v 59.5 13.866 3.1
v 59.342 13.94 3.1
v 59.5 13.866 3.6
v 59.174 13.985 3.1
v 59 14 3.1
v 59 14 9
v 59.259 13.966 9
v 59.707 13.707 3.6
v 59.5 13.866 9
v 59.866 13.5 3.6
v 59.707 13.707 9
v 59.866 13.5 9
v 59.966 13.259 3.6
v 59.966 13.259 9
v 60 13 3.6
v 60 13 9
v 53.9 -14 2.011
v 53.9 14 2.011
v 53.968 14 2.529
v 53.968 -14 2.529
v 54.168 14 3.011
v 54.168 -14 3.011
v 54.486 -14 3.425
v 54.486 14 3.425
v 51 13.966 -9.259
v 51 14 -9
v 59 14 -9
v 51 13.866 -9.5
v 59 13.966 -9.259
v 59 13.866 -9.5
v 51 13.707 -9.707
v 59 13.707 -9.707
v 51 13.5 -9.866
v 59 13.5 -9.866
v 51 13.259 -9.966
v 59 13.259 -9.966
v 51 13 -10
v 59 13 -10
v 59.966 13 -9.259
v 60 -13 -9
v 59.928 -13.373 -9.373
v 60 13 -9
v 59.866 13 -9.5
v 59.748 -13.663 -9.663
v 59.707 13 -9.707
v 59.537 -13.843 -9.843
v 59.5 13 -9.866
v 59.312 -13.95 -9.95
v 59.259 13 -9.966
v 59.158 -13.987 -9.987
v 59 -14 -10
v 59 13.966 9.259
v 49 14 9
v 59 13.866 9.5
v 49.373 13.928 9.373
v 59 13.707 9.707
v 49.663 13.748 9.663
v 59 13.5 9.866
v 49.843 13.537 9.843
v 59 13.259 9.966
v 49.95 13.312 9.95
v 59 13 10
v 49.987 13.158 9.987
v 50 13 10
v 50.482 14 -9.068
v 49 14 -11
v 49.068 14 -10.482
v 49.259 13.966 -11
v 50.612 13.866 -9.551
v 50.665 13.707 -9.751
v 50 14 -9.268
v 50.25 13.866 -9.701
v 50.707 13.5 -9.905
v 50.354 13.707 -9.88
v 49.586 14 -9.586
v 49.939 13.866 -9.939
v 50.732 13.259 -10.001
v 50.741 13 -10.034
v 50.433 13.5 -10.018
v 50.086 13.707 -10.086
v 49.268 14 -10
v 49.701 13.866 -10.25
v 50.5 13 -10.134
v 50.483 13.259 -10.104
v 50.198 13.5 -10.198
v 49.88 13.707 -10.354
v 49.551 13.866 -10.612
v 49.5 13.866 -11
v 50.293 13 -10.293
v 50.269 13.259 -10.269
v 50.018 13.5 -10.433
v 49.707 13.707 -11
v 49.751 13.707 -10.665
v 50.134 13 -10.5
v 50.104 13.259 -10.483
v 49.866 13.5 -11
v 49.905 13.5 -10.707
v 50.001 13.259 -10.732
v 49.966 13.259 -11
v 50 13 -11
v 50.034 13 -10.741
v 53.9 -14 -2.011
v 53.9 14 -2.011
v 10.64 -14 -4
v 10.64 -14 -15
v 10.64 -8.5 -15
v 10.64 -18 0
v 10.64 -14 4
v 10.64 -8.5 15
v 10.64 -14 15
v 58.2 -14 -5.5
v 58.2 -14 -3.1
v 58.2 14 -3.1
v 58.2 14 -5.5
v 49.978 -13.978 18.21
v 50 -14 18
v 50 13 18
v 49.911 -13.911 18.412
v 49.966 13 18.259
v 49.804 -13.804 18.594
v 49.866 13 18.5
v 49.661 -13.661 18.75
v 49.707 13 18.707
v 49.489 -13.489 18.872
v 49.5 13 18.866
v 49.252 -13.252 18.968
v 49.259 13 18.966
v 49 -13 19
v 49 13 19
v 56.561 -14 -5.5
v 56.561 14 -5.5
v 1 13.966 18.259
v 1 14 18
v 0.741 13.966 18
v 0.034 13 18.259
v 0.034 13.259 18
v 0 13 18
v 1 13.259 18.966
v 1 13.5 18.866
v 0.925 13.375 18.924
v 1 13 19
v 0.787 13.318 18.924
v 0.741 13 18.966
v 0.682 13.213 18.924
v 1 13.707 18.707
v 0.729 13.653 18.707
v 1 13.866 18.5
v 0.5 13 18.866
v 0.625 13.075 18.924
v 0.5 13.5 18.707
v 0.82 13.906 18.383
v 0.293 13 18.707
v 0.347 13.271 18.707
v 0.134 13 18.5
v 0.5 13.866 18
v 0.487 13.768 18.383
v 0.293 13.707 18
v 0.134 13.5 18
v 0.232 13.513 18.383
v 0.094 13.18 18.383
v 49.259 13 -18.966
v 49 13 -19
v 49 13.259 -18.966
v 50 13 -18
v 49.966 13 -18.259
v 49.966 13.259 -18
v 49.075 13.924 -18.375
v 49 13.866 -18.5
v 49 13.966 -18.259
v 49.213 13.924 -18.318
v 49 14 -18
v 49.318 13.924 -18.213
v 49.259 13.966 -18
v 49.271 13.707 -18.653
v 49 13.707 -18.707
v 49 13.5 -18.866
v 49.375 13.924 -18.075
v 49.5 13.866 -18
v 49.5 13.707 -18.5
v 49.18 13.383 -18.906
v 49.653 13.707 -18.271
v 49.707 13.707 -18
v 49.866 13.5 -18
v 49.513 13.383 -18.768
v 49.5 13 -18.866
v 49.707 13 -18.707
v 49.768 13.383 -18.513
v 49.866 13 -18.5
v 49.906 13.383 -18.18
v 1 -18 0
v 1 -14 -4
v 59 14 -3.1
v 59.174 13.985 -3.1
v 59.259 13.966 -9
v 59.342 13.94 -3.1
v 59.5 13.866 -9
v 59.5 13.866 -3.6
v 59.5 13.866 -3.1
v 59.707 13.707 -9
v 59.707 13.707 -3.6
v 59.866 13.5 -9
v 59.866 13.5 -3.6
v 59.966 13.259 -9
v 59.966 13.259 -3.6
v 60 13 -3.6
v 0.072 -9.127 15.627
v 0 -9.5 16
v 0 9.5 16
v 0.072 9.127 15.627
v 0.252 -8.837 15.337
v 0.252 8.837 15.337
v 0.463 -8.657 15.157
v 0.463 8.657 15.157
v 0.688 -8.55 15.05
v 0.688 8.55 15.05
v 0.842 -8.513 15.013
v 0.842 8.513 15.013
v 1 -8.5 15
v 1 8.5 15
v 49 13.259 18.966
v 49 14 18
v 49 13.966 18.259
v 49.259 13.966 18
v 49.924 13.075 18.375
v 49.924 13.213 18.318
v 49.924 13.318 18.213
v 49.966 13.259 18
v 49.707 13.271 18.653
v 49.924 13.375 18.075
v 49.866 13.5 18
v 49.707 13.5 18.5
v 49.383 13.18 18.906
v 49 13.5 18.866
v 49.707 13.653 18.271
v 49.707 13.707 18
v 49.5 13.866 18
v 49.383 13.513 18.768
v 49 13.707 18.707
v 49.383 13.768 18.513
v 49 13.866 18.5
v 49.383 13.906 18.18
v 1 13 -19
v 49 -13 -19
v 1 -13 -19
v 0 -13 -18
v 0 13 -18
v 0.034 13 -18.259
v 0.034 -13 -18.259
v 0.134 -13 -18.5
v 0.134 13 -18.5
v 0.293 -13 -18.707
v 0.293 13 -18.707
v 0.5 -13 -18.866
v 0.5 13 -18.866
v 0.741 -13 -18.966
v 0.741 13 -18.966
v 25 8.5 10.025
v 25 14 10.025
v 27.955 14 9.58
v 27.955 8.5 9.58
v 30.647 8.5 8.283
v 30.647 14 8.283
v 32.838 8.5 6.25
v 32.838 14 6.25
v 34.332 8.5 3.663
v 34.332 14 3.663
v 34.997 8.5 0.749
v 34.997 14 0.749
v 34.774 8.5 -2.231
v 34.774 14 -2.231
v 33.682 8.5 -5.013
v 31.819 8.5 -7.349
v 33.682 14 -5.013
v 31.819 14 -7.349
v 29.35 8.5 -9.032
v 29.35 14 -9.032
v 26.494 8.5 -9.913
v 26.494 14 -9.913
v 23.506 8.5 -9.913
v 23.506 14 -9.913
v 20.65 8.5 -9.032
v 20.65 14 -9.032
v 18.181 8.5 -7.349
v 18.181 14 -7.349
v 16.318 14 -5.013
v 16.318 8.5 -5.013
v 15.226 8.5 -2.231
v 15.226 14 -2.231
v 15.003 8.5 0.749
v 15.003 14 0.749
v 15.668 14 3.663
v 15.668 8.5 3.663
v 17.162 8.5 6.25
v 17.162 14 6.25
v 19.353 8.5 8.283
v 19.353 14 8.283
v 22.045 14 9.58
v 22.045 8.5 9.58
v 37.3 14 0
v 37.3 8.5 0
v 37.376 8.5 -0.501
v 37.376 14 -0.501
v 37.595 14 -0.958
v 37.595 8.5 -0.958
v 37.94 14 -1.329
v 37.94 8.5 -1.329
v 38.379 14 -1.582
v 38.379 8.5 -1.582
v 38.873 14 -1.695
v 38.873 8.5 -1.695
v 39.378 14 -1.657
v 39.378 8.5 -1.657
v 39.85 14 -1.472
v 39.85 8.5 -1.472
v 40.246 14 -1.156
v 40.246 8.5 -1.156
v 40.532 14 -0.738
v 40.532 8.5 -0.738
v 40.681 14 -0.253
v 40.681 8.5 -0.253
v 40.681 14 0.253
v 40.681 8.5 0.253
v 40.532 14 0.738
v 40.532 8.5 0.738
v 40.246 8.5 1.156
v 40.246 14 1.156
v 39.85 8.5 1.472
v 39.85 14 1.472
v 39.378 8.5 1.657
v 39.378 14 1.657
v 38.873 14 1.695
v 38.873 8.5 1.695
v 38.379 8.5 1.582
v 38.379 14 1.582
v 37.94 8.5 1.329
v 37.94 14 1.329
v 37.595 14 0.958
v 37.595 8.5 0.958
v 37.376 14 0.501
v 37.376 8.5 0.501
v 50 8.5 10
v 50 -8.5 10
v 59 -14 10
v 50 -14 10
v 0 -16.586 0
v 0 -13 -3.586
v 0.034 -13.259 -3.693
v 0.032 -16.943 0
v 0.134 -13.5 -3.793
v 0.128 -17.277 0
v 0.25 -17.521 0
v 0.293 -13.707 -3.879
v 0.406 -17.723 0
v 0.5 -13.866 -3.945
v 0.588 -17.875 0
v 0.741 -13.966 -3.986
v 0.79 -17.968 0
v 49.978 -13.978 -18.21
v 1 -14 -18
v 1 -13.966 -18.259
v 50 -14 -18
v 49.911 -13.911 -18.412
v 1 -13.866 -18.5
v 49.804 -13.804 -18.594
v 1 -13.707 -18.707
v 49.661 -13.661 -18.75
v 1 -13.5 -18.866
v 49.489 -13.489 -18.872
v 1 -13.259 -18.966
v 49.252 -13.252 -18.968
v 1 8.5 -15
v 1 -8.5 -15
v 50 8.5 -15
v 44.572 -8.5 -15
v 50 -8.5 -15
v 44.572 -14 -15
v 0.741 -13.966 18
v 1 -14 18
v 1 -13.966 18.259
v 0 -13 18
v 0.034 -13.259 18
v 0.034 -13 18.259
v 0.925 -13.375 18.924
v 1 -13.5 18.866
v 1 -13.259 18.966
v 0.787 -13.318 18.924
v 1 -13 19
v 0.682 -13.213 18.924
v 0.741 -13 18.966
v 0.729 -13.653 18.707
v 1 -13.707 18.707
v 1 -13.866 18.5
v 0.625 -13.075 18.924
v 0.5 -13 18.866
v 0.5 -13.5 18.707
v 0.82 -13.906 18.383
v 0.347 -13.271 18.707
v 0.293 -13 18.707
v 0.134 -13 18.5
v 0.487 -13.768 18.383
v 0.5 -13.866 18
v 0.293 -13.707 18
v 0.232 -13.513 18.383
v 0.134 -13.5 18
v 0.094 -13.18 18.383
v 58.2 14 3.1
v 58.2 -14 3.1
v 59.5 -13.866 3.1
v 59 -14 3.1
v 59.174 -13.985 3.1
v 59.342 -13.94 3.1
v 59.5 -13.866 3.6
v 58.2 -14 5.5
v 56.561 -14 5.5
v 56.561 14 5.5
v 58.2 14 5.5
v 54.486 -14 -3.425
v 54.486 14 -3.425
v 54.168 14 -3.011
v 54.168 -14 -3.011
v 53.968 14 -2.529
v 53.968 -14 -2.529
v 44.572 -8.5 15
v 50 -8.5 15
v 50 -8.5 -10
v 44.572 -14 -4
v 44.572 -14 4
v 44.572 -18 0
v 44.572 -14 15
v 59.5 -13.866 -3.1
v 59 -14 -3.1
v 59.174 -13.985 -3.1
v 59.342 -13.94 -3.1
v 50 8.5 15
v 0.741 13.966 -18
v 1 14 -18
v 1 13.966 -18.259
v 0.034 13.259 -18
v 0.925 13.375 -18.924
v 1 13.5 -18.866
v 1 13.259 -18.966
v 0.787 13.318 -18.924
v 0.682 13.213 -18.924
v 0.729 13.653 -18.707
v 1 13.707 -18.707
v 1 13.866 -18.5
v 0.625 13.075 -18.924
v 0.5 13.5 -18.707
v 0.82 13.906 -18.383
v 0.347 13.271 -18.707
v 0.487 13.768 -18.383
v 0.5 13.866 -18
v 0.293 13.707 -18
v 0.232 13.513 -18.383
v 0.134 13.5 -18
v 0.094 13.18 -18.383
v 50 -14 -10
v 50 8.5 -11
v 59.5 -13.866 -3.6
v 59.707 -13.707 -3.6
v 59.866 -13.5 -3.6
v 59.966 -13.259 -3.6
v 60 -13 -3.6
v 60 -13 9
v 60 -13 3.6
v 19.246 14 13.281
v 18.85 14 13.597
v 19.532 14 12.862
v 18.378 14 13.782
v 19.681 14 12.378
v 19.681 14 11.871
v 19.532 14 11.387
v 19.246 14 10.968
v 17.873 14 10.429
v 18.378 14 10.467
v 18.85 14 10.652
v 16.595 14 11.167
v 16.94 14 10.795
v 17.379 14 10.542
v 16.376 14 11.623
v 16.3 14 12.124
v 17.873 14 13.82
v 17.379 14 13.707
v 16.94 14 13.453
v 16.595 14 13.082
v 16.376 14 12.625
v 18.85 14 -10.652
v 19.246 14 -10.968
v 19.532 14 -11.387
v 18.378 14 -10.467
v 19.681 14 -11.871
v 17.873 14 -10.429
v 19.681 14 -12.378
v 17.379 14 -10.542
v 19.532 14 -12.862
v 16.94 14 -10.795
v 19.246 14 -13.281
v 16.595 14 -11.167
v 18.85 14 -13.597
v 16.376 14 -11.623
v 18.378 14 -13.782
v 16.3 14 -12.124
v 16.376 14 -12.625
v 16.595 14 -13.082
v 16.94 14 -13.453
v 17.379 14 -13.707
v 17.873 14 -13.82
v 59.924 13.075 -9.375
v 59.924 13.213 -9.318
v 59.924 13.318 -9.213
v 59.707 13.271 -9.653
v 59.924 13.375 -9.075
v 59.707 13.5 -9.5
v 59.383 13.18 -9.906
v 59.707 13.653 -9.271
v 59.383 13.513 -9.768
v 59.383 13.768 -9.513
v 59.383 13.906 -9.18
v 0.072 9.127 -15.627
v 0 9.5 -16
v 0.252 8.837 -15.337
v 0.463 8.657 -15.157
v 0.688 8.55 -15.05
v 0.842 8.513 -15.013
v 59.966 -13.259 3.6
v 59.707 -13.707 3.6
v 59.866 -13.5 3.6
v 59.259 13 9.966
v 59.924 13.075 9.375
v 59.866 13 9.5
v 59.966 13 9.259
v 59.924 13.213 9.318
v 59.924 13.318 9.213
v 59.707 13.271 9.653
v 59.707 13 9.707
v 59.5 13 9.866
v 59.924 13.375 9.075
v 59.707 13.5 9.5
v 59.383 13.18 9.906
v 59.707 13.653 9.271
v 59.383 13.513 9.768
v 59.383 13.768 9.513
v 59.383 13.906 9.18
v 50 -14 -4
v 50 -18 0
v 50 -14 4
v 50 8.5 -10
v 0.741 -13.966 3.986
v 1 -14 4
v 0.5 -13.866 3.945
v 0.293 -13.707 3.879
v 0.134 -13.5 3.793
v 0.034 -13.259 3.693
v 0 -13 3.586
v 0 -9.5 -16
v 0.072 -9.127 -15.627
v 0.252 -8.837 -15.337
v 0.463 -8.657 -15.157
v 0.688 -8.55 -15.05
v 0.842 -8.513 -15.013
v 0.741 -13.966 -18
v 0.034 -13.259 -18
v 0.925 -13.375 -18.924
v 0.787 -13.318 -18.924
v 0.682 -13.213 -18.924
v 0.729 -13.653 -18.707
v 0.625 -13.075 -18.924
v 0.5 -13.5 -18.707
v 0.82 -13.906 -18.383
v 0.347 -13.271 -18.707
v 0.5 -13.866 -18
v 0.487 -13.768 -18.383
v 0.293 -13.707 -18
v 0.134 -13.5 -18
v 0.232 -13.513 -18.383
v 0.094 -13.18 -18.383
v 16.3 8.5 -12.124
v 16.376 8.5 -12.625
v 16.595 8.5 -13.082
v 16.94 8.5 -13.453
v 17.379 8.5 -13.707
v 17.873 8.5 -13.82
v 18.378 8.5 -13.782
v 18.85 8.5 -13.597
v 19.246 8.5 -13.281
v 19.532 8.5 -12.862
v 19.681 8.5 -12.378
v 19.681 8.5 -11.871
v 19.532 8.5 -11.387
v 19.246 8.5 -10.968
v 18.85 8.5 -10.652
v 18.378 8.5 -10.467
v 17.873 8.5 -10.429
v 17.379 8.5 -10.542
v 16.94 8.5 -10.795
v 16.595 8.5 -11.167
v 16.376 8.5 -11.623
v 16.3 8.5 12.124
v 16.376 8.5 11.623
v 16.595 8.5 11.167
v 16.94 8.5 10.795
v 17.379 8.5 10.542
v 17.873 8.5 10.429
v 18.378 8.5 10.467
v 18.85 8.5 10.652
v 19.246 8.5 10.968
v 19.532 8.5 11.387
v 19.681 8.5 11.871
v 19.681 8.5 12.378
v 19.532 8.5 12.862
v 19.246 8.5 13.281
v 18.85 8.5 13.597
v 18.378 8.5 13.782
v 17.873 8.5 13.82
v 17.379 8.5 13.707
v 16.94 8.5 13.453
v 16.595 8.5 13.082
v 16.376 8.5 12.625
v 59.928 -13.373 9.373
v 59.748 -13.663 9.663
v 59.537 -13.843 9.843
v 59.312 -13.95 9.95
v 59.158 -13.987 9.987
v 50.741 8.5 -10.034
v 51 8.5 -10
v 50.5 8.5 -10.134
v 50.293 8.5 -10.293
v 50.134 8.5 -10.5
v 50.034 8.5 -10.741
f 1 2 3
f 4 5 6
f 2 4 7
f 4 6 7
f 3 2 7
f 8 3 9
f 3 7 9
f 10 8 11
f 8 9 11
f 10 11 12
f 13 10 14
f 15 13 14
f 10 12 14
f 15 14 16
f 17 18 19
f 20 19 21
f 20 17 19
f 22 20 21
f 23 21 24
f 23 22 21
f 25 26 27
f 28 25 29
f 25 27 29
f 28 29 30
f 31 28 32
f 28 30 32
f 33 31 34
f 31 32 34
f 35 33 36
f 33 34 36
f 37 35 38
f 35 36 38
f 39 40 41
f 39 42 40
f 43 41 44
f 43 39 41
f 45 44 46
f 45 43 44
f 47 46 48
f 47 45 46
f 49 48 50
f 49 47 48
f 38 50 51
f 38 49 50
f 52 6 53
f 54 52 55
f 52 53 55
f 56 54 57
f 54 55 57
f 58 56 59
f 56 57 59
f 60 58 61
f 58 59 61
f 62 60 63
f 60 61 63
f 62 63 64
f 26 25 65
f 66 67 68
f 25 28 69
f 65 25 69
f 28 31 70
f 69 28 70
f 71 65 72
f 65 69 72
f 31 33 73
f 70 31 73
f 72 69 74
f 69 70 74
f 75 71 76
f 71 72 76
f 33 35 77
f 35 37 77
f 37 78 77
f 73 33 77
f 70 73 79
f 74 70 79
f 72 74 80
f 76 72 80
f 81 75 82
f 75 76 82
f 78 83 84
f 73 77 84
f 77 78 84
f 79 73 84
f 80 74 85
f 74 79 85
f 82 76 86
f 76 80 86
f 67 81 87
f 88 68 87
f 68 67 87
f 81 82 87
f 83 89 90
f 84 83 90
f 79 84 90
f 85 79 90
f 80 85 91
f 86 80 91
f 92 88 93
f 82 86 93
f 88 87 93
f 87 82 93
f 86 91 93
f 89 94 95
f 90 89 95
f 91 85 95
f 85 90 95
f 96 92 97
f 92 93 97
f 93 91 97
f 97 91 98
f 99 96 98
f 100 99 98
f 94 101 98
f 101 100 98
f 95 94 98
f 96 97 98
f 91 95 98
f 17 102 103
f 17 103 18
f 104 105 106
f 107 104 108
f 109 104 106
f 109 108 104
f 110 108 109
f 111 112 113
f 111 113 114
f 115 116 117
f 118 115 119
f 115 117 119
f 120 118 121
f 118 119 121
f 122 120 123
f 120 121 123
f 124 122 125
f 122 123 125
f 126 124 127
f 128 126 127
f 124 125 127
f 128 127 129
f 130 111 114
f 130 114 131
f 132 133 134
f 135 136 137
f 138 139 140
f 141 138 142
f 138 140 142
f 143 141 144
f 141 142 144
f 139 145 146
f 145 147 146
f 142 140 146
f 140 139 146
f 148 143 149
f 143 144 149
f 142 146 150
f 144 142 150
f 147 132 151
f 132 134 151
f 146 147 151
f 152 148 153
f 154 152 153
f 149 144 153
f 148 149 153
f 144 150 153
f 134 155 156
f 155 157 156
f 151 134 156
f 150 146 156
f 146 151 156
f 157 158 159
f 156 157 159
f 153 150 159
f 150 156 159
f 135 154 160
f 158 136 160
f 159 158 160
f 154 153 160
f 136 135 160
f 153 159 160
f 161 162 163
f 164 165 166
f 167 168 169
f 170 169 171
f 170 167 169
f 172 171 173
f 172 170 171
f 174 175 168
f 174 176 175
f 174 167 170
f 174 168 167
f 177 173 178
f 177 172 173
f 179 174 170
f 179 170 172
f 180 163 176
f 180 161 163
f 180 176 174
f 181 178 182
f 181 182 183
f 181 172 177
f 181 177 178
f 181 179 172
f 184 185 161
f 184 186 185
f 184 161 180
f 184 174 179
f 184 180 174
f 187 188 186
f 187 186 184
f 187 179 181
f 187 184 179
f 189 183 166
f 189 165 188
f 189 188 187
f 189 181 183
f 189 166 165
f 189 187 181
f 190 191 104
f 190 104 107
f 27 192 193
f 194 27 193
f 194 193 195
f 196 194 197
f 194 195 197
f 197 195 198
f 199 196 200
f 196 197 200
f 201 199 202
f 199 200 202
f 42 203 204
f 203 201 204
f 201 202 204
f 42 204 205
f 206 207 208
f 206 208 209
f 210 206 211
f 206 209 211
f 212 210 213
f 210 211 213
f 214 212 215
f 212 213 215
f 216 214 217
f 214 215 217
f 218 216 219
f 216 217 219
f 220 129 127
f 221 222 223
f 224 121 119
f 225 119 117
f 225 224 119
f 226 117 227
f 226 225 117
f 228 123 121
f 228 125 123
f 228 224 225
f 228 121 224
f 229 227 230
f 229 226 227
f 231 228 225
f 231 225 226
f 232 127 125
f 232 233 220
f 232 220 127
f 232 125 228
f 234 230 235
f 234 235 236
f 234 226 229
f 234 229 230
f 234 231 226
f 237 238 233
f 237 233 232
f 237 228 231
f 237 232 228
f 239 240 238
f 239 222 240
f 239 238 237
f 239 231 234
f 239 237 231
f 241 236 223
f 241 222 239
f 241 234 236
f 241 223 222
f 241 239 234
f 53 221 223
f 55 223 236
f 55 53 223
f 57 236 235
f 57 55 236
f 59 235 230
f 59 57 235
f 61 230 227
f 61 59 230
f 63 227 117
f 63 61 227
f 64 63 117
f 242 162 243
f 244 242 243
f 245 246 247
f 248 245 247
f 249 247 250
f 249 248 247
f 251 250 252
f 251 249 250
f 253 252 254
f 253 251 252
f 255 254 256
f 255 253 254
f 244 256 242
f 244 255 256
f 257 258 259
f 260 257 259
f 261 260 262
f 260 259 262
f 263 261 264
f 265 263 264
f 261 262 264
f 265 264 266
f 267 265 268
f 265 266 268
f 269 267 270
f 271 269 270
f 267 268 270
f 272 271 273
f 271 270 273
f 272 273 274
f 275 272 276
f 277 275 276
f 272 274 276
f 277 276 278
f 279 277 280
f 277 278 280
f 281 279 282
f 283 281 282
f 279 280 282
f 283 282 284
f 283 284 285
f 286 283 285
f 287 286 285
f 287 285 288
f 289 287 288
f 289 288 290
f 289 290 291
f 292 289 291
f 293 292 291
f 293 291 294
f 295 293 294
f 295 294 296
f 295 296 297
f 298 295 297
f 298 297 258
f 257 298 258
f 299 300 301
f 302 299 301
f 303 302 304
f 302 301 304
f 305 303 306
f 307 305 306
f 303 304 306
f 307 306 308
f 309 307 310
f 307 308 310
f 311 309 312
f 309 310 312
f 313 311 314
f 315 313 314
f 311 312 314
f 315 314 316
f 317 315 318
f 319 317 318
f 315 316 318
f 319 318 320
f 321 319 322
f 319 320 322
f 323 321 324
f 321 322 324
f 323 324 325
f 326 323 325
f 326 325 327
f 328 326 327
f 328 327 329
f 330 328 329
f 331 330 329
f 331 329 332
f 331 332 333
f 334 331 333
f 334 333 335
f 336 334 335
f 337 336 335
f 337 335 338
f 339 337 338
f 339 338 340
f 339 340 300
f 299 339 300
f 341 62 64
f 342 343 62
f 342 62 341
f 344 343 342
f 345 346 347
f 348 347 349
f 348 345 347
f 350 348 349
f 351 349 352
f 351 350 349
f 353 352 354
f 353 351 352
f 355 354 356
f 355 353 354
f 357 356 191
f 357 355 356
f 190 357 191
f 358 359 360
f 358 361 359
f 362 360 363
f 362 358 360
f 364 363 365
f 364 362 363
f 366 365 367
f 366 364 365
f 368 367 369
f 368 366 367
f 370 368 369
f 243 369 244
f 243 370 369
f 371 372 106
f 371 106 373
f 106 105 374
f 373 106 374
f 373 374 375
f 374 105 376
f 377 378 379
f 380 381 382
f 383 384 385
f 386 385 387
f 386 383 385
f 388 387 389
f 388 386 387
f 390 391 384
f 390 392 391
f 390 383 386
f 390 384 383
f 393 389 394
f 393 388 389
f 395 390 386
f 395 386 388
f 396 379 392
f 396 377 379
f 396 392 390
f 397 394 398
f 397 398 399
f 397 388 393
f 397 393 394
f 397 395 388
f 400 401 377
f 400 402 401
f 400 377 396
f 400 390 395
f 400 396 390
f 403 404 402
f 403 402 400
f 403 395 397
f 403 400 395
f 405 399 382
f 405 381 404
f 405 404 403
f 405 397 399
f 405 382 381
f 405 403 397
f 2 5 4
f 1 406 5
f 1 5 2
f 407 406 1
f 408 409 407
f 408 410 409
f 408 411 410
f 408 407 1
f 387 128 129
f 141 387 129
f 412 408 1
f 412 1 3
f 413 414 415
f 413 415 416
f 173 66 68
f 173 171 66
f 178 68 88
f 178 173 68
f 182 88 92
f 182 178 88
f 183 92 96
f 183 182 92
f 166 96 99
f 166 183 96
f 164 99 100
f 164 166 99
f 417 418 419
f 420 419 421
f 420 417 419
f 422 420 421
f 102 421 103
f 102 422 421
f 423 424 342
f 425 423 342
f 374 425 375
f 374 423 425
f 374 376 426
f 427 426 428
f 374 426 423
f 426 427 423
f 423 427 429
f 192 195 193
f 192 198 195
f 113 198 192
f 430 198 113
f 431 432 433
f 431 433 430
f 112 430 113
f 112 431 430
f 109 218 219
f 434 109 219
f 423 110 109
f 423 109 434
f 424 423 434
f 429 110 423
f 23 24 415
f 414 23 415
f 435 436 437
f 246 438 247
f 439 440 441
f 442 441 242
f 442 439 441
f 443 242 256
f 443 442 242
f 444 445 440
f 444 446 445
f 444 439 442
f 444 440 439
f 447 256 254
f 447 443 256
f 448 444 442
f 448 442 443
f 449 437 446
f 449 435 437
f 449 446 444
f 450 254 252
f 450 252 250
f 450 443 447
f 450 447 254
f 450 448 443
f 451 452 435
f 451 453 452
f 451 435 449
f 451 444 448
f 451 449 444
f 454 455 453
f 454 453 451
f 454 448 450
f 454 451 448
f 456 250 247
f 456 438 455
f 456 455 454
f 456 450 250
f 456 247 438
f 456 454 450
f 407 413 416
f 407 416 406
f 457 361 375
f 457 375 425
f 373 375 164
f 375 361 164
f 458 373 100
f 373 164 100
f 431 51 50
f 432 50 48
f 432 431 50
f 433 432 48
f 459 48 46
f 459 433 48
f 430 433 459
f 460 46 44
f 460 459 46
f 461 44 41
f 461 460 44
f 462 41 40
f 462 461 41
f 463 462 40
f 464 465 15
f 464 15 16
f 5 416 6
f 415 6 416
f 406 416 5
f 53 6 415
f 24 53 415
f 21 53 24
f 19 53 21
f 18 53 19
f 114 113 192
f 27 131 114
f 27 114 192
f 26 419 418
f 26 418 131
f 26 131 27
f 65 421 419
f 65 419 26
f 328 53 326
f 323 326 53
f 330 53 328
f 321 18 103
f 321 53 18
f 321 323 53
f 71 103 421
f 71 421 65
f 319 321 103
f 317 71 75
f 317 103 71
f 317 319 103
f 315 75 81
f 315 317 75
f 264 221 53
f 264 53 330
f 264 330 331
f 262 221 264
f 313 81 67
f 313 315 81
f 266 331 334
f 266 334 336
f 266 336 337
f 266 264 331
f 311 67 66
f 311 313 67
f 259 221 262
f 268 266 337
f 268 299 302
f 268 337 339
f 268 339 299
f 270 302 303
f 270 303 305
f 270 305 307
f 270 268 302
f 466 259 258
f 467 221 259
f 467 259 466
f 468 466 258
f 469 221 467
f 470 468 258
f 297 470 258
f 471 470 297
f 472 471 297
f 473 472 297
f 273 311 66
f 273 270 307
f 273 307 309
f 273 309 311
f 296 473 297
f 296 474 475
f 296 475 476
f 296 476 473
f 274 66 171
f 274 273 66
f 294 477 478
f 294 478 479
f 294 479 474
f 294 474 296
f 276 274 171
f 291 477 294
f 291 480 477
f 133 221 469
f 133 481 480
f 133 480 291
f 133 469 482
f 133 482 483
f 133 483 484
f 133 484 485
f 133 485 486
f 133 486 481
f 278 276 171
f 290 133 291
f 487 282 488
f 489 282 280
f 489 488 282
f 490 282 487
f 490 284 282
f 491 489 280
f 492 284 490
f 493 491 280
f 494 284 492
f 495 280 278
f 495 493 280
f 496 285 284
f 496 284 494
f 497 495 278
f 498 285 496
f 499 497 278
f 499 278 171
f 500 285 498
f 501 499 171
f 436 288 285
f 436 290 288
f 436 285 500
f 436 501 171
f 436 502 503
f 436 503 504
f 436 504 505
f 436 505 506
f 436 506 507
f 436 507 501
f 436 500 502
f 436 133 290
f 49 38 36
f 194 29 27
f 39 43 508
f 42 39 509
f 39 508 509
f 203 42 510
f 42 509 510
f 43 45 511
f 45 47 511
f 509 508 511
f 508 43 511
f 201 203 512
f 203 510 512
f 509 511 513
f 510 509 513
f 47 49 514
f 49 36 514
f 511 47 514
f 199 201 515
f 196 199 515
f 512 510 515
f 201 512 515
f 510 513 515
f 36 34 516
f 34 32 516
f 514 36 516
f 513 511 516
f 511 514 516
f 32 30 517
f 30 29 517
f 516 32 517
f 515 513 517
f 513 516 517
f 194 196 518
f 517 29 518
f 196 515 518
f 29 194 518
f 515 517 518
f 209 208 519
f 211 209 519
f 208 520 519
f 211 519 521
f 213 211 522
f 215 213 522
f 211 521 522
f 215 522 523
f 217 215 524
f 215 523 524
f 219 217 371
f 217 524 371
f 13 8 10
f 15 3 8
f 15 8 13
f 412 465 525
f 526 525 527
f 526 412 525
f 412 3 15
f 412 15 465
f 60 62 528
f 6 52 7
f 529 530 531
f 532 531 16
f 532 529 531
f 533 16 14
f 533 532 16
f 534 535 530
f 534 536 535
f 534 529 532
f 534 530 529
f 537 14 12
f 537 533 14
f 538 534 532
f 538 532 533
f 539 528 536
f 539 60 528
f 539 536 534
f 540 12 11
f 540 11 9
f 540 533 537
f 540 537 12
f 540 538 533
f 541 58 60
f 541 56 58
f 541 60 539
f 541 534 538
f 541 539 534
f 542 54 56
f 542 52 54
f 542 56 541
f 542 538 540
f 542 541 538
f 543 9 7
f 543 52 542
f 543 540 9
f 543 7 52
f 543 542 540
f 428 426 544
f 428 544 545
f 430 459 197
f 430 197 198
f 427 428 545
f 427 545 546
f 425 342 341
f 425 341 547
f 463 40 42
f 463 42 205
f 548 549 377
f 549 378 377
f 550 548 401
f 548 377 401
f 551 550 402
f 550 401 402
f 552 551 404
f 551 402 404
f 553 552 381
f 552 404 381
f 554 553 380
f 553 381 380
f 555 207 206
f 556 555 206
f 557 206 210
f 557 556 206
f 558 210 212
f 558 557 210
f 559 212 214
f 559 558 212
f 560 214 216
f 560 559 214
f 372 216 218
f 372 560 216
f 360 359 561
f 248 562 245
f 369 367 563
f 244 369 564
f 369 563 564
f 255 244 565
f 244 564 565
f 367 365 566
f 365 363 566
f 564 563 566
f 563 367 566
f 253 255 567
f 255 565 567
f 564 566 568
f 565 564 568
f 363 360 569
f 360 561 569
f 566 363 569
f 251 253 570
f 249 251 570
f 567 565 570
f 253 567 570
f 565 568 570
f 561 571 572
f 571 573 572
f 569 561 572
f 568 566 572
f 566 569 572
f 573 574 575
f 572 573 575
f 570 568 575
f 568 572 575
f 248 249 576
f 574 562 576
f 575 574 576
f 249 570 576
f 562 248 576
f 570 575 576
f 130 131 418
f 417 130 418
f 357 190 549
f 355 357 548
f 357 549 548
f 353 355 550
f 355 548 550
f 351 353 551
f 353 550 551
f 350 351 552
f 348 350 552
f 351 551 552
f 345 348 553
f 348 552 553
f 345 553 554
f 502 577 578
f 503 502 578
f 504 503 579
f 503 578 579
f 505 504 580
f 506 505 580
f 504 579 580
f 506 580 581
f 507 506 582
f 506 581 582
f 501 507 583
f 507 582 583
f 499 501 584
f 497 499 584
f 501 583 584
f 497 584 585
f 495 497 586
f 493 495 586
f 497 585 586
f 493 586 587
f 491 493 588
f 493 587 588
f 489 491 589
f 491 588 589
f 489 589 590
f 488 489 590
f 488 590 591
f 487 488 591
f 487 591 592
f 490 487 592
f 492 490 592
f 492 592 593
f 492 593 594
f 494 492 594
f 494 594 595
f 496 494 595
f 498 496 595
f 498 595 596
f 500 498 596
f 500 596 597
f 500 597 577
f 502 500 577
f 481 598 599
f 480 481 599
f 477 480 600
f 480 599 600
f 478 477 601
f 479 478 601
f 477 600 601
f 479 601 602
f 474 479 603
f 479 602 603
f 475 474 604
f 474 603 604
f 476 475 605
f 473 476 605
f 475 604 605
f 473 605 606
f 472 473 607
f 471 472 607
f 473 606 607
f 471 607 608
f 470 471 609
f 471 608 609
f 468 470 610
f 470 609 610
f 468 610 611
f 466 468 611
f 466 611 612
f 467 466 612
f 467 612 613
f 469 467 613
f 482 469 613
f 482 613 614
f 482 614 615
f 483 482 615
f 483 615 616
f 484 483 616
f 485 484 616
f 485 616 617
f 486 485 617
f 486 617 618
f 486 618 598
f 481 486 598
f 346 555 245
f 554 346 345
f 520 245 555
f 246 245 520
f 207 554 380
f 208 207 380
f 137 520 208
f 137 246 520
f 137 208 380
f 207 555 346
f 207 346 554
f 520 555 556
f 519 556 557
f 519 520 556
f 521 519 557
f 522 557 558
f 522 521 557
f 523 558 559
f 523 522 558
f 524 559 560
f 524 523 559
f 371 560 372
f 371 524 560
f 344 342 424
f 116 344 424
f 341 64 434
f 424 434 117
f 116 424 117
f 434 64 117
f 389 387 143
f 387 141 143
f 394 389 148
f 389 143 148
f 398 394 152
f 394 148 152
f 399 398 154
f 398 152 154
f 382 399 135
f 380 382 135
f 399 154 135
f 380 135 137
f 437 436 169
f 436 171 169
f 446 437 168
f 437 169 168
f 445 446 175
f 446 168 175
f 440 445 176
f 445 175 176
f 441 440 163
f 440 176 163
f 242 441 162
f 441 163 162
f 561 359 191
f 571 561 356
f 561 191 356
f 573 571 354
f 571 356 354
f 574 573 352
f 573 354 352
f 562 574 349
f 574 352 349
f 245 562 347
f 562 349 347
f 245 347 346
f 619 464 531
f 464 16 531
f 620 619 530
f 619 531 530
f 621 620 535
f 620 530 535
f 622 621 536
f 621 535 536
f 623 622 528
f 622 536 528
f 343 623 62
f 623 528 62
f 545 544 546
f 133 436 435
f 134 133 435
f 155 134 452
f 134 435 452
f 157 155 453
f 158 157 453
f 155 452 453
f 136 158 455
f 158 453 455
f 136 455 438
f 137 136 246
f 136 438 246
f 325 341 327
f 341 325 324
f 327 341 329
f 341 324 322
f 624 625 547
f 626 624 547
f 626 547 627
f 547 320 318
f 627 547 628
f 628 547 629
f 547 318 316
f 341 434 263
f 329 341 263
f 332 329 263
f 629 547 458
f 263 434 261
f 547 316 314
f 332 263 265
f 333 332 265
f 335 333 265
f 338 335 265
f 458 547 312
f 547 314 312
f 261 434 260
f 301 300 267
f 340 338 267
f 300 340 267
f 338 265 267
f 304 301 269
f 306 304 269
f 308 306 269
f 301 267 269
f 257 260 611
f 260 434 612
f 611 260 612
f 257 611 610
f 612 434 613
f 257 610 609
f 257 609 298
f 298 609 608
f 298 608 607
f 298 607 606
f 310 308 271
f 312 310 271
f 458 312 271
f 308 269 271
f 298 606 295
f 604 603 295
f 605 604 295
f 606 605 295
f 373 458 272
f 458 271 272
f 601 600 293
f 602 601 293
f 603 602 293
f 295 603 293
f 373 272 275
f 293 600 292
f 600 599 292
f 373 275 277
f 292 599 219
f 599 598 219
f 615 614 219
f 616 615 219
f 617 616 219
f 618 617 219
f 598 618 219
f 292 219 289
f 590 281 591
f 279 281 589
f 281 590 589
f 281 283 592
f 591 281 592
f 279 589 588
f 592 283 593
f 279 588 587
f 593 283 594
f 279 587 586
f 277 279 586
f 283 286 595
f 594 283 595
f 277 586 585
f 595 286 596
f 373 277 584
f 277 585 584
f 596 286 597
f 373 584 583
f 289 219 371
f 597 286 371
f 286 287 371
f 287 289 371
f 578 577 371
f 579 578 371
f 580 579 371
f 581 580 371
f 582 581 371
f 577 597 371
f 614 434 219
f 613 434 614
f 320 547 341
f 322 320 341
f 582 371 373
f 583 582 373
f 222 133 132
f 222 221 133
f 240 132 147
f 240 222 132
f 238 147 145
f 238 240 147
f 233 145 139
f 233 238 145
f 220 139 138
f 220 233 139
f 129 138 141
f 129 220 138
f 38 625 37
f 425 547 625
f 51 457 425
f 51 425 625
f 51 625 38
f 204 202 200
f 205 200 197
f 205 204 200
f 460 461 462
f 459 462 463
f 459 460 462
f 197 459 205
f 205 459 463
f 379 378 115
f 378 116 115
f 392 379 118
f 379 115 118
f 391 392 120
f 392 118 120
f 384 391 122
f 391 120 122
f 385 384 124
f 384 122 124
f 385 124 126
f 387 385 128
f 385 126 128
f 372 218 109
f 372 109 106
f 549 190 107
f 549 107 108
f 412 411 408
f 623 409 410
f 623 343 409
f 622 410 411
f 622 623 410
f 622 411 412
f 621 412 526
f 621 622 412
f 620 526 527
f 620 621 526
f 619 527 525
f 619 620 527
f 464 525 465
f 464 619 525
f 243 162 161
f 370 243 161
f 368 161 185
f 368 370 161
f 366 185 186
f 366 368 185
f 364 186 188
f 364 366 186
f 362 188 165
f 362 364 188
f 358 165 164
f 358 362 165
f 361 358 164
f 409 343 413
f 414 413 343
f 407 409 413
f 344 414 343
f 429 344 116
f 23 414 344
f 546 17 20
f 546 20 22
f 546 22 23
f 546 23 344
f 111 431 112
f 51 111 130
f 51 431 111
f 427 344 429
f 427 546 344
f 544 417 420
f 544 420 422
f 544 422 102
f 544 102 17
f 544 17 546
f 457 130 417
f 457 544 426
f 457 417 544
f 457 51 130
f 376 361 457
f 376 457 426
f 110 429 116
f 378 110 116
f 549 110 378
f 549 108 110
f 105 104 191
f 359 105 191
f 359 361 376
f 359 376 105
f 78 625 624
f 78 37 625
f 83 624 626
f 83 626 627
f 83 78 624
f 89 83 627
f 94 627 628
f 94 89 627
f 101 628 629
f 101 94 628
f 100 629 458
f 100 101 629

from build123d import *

# Parameters (mm, degrees)
SKETCH2_W                      = 30
SKETCH2_H                      = 17
BOSS_EXTRUDE1_DEPTH            = 50
CUT_EXTRUDE4_REACH             = 64.33
SKETCH7_R                      = 10.025
F_3_0MM_DOWEL_HOLE1_D          = 3.4
F_3_0MM_DOWEL_HOLE1_DEPTH      = 5.5
BOSS_EXTRUDE2_REACH            = 62.374
FILLET1_R                      = 1
CUT_EXTRUDE7_REACH             = 70.884
SKETCH13_W                     = 33.931840249
SKETCH13_H                     = 30
CUT_EXTRUDE7_DIRECTION_2_DEPTH = 10


with BuildPart() as part:
    # Sketch2 → Boss-Extrude1 (new body)
    with BuildSketch(Plane(origin=(0, 0, 0), x_dir=(0, 0, -1), z_dir=(1, 0, 0))):
        Polygon((19, -14), (3.999996995, -14), (0, -17.999996995), (-3.999996995, -14), (-19, -14), (-19, 14), (19, 14), align=None)
        Rectangle(SKETCH2_W, SKETCH2_H, mode=Mode.SUBTRACT)
    extrude(amount=BOSS_EXTRUDE1_DEPTH)

    # Sketch7 → Cut-Extrude4 (cut, up to next)
    with BuildSketch(Plane(origin=(0, 14, 0), x_dir=(1, 0, 0), z_dir=(0, 1, 0)), mode=Mode.PRIVATE) as cut_extrude4_sk1:
        with Locations(Location((25, 0, 0), (0, 0, 270))):
            Circle(SKETCH7_R)
    cut_extrude4_tool1 = extrude(cut_extrude4_sk1.sketch, amount=-CUT_EXTRUDE4_REACH, mode=Mode.PRIVATE) & part.part
    add(cut_extrude4_tool1.solids().sort_by_distance((25, 14, 0))[0], mode=Mode.SUBTRACT)

    # Ø3.0mm Dowel Hole1
    with Locations(Plane(origin=(0, 14, 0), x_dir=(1, 0, 0), z_dir=(0, 1, 0))):
        with Locations((18, -12.124355653), (18, 12.124355653), (39, 0)):
            Hole(F_3_0MM_DOWEL_HOLE1_D / 2, depth=F_3_0MM_DOWEL_HOLE1_DEPTH)

    # Boss-Extrude2: up to this face of the body (flat: up to its plane)
    boss_extrude2_end = Plane(part.part.faces().sort_by_distance((25, 14, 18.371987261))[0])
    # Sketch6 → Boss-Extrude2 (add, up to the picked face)
    with BuildSketch(Plane(origin=(0, -14, 0), x_dir=(1, 0, 0), z_dir=(0, 1, 0)), mode=Mode.PRIVATE) as boss_extrude2_sk1:
        with BuildLine():
            Line((60, 3.6), (59.5, 3.6))
            Line((59.5, 3.6), (59.5, 3.1))
            Line((59.5, 3.1), (58.2, 3.1))
            Line((58.2, 3.1), (58.2, 5.5))
            Line((58.2, 5.5), (56.560660172, 5.5))
            Line((56.560660172, 5.5), (54.485786438, 3.425126266))
            ThreePointArc((54.485786438, 3.425126266), (54.052240935, 2.776279568), (53.9, 2.010912703))
            Line((53.9, 2.010912703), (53.9, -2.010912703))
            ThreePointArc((53.9, -2.010912703), (54.052240935, -2.776279568), (54.485786438, -3.425126266))
            Line((54.485786438, -3.425126266), (56.560660172, -5.5))
            Line((56.560660172, -5.5), (58.2, -5.5))
            Line((58.2, -5.5), (58.2, -3.1))
            Line((58.2, -3.1), (59.5, -3.1))
            Line((59.5, -3.1), (59.5, -3.6))
            Line((59.5, -3.6), (60, -3.6))
            Line((60, -3.6), (60, -10))
            Line((60, -10), (50, -10))
            Line((50, -10), (50, 10))
            Line((50, 10), (60, 10))
            Line((60, 10), (60, 3.6))
        make_face()
    boss_extrude2_tool1 = split(extrude(boss_extrude2_sk1.sketch, amount=BOSS_EXTRUDE2_REACH, mode=Mode.PRIVATE), bisect_by=boss_extrude2_end, keep=Keep.BOTH, mode=Mode.PRIVATE)
    add(boss_extrude2_tool1.solids().sort_by(Axis((59.75, -14, -3.823607), (0, 1, 0)))[0])

    # Fillet1
    fillet1_edges = [part.edges().sort_by_distance(p)[0] for p in [
        (55, 14, -10),
        (0, -8.5, 0),
        (0, 0, 15),
        (0, 8.5, 0),
        (0, 0, -15),
        (0, -14, 11.499998498),
        (0, -15.999998498, 1.999998498),
        (0, -15.999998498, -1.999998498),
        (0, -14, -11.499998498),
        (0, 14, 0),
        (25, -14, -19),
        (50, 0, -19),
        (25, 14, -19),
        (0, 0, -19),
        (25, 14, 19),
        (50, 0, 19),
        (25, -14, 19),
        (0, 0, 19),
        (50, 14, -14.5),
        (50, 11.25, -10),
        (55, 14, 10),
        (50, 14, 14.5),
        (60, 0, -10),
        (60, 0, 10),
        (60, -14, 6.8),
        (60, -14, -6.8),
        (60, 14, 6.8),
        (60, 14, -6.8),
    ]]
    fillet(fillet1_edges, radius=FILLET1_R)

    # Sketch13 → Cut-Extrude7 (cut, up to next)
    with BuildSketch(Plane.XZ.offset(14), mode=Mode.PRIVATE) as cut_extrude7_sk1:
        with Locations((27.606274686, 0)):
            Rectangle(SKETCH13_W, SKETCH13_H)
    cut_extrude7_tool1 = extrude(cut_extrude7_sk1.sketch, amount=-CUT_EXTRUDE7_REACH, mode=Mode.PRIVATE) & part.part
    add(cut_extrude7_tool1.solids().sort_by_distance((27.606275, -14, 0))[0], mode=Mode.SUBTRACT)

    # Sketch13 → Cut-Extrude7 direction 2 (cut)
    with BuildSketch(Plane.XZ.offset(14)):
        with Locations((27.606274686, 0)):
            Rectangle(SKETCH13_W, SKETCH13_H)
    extrude(amount=CUT_EXTRUDE7_DIRECTION_2_DEPTH, mode=Mode.SUBTRACT)


solid = part.part
